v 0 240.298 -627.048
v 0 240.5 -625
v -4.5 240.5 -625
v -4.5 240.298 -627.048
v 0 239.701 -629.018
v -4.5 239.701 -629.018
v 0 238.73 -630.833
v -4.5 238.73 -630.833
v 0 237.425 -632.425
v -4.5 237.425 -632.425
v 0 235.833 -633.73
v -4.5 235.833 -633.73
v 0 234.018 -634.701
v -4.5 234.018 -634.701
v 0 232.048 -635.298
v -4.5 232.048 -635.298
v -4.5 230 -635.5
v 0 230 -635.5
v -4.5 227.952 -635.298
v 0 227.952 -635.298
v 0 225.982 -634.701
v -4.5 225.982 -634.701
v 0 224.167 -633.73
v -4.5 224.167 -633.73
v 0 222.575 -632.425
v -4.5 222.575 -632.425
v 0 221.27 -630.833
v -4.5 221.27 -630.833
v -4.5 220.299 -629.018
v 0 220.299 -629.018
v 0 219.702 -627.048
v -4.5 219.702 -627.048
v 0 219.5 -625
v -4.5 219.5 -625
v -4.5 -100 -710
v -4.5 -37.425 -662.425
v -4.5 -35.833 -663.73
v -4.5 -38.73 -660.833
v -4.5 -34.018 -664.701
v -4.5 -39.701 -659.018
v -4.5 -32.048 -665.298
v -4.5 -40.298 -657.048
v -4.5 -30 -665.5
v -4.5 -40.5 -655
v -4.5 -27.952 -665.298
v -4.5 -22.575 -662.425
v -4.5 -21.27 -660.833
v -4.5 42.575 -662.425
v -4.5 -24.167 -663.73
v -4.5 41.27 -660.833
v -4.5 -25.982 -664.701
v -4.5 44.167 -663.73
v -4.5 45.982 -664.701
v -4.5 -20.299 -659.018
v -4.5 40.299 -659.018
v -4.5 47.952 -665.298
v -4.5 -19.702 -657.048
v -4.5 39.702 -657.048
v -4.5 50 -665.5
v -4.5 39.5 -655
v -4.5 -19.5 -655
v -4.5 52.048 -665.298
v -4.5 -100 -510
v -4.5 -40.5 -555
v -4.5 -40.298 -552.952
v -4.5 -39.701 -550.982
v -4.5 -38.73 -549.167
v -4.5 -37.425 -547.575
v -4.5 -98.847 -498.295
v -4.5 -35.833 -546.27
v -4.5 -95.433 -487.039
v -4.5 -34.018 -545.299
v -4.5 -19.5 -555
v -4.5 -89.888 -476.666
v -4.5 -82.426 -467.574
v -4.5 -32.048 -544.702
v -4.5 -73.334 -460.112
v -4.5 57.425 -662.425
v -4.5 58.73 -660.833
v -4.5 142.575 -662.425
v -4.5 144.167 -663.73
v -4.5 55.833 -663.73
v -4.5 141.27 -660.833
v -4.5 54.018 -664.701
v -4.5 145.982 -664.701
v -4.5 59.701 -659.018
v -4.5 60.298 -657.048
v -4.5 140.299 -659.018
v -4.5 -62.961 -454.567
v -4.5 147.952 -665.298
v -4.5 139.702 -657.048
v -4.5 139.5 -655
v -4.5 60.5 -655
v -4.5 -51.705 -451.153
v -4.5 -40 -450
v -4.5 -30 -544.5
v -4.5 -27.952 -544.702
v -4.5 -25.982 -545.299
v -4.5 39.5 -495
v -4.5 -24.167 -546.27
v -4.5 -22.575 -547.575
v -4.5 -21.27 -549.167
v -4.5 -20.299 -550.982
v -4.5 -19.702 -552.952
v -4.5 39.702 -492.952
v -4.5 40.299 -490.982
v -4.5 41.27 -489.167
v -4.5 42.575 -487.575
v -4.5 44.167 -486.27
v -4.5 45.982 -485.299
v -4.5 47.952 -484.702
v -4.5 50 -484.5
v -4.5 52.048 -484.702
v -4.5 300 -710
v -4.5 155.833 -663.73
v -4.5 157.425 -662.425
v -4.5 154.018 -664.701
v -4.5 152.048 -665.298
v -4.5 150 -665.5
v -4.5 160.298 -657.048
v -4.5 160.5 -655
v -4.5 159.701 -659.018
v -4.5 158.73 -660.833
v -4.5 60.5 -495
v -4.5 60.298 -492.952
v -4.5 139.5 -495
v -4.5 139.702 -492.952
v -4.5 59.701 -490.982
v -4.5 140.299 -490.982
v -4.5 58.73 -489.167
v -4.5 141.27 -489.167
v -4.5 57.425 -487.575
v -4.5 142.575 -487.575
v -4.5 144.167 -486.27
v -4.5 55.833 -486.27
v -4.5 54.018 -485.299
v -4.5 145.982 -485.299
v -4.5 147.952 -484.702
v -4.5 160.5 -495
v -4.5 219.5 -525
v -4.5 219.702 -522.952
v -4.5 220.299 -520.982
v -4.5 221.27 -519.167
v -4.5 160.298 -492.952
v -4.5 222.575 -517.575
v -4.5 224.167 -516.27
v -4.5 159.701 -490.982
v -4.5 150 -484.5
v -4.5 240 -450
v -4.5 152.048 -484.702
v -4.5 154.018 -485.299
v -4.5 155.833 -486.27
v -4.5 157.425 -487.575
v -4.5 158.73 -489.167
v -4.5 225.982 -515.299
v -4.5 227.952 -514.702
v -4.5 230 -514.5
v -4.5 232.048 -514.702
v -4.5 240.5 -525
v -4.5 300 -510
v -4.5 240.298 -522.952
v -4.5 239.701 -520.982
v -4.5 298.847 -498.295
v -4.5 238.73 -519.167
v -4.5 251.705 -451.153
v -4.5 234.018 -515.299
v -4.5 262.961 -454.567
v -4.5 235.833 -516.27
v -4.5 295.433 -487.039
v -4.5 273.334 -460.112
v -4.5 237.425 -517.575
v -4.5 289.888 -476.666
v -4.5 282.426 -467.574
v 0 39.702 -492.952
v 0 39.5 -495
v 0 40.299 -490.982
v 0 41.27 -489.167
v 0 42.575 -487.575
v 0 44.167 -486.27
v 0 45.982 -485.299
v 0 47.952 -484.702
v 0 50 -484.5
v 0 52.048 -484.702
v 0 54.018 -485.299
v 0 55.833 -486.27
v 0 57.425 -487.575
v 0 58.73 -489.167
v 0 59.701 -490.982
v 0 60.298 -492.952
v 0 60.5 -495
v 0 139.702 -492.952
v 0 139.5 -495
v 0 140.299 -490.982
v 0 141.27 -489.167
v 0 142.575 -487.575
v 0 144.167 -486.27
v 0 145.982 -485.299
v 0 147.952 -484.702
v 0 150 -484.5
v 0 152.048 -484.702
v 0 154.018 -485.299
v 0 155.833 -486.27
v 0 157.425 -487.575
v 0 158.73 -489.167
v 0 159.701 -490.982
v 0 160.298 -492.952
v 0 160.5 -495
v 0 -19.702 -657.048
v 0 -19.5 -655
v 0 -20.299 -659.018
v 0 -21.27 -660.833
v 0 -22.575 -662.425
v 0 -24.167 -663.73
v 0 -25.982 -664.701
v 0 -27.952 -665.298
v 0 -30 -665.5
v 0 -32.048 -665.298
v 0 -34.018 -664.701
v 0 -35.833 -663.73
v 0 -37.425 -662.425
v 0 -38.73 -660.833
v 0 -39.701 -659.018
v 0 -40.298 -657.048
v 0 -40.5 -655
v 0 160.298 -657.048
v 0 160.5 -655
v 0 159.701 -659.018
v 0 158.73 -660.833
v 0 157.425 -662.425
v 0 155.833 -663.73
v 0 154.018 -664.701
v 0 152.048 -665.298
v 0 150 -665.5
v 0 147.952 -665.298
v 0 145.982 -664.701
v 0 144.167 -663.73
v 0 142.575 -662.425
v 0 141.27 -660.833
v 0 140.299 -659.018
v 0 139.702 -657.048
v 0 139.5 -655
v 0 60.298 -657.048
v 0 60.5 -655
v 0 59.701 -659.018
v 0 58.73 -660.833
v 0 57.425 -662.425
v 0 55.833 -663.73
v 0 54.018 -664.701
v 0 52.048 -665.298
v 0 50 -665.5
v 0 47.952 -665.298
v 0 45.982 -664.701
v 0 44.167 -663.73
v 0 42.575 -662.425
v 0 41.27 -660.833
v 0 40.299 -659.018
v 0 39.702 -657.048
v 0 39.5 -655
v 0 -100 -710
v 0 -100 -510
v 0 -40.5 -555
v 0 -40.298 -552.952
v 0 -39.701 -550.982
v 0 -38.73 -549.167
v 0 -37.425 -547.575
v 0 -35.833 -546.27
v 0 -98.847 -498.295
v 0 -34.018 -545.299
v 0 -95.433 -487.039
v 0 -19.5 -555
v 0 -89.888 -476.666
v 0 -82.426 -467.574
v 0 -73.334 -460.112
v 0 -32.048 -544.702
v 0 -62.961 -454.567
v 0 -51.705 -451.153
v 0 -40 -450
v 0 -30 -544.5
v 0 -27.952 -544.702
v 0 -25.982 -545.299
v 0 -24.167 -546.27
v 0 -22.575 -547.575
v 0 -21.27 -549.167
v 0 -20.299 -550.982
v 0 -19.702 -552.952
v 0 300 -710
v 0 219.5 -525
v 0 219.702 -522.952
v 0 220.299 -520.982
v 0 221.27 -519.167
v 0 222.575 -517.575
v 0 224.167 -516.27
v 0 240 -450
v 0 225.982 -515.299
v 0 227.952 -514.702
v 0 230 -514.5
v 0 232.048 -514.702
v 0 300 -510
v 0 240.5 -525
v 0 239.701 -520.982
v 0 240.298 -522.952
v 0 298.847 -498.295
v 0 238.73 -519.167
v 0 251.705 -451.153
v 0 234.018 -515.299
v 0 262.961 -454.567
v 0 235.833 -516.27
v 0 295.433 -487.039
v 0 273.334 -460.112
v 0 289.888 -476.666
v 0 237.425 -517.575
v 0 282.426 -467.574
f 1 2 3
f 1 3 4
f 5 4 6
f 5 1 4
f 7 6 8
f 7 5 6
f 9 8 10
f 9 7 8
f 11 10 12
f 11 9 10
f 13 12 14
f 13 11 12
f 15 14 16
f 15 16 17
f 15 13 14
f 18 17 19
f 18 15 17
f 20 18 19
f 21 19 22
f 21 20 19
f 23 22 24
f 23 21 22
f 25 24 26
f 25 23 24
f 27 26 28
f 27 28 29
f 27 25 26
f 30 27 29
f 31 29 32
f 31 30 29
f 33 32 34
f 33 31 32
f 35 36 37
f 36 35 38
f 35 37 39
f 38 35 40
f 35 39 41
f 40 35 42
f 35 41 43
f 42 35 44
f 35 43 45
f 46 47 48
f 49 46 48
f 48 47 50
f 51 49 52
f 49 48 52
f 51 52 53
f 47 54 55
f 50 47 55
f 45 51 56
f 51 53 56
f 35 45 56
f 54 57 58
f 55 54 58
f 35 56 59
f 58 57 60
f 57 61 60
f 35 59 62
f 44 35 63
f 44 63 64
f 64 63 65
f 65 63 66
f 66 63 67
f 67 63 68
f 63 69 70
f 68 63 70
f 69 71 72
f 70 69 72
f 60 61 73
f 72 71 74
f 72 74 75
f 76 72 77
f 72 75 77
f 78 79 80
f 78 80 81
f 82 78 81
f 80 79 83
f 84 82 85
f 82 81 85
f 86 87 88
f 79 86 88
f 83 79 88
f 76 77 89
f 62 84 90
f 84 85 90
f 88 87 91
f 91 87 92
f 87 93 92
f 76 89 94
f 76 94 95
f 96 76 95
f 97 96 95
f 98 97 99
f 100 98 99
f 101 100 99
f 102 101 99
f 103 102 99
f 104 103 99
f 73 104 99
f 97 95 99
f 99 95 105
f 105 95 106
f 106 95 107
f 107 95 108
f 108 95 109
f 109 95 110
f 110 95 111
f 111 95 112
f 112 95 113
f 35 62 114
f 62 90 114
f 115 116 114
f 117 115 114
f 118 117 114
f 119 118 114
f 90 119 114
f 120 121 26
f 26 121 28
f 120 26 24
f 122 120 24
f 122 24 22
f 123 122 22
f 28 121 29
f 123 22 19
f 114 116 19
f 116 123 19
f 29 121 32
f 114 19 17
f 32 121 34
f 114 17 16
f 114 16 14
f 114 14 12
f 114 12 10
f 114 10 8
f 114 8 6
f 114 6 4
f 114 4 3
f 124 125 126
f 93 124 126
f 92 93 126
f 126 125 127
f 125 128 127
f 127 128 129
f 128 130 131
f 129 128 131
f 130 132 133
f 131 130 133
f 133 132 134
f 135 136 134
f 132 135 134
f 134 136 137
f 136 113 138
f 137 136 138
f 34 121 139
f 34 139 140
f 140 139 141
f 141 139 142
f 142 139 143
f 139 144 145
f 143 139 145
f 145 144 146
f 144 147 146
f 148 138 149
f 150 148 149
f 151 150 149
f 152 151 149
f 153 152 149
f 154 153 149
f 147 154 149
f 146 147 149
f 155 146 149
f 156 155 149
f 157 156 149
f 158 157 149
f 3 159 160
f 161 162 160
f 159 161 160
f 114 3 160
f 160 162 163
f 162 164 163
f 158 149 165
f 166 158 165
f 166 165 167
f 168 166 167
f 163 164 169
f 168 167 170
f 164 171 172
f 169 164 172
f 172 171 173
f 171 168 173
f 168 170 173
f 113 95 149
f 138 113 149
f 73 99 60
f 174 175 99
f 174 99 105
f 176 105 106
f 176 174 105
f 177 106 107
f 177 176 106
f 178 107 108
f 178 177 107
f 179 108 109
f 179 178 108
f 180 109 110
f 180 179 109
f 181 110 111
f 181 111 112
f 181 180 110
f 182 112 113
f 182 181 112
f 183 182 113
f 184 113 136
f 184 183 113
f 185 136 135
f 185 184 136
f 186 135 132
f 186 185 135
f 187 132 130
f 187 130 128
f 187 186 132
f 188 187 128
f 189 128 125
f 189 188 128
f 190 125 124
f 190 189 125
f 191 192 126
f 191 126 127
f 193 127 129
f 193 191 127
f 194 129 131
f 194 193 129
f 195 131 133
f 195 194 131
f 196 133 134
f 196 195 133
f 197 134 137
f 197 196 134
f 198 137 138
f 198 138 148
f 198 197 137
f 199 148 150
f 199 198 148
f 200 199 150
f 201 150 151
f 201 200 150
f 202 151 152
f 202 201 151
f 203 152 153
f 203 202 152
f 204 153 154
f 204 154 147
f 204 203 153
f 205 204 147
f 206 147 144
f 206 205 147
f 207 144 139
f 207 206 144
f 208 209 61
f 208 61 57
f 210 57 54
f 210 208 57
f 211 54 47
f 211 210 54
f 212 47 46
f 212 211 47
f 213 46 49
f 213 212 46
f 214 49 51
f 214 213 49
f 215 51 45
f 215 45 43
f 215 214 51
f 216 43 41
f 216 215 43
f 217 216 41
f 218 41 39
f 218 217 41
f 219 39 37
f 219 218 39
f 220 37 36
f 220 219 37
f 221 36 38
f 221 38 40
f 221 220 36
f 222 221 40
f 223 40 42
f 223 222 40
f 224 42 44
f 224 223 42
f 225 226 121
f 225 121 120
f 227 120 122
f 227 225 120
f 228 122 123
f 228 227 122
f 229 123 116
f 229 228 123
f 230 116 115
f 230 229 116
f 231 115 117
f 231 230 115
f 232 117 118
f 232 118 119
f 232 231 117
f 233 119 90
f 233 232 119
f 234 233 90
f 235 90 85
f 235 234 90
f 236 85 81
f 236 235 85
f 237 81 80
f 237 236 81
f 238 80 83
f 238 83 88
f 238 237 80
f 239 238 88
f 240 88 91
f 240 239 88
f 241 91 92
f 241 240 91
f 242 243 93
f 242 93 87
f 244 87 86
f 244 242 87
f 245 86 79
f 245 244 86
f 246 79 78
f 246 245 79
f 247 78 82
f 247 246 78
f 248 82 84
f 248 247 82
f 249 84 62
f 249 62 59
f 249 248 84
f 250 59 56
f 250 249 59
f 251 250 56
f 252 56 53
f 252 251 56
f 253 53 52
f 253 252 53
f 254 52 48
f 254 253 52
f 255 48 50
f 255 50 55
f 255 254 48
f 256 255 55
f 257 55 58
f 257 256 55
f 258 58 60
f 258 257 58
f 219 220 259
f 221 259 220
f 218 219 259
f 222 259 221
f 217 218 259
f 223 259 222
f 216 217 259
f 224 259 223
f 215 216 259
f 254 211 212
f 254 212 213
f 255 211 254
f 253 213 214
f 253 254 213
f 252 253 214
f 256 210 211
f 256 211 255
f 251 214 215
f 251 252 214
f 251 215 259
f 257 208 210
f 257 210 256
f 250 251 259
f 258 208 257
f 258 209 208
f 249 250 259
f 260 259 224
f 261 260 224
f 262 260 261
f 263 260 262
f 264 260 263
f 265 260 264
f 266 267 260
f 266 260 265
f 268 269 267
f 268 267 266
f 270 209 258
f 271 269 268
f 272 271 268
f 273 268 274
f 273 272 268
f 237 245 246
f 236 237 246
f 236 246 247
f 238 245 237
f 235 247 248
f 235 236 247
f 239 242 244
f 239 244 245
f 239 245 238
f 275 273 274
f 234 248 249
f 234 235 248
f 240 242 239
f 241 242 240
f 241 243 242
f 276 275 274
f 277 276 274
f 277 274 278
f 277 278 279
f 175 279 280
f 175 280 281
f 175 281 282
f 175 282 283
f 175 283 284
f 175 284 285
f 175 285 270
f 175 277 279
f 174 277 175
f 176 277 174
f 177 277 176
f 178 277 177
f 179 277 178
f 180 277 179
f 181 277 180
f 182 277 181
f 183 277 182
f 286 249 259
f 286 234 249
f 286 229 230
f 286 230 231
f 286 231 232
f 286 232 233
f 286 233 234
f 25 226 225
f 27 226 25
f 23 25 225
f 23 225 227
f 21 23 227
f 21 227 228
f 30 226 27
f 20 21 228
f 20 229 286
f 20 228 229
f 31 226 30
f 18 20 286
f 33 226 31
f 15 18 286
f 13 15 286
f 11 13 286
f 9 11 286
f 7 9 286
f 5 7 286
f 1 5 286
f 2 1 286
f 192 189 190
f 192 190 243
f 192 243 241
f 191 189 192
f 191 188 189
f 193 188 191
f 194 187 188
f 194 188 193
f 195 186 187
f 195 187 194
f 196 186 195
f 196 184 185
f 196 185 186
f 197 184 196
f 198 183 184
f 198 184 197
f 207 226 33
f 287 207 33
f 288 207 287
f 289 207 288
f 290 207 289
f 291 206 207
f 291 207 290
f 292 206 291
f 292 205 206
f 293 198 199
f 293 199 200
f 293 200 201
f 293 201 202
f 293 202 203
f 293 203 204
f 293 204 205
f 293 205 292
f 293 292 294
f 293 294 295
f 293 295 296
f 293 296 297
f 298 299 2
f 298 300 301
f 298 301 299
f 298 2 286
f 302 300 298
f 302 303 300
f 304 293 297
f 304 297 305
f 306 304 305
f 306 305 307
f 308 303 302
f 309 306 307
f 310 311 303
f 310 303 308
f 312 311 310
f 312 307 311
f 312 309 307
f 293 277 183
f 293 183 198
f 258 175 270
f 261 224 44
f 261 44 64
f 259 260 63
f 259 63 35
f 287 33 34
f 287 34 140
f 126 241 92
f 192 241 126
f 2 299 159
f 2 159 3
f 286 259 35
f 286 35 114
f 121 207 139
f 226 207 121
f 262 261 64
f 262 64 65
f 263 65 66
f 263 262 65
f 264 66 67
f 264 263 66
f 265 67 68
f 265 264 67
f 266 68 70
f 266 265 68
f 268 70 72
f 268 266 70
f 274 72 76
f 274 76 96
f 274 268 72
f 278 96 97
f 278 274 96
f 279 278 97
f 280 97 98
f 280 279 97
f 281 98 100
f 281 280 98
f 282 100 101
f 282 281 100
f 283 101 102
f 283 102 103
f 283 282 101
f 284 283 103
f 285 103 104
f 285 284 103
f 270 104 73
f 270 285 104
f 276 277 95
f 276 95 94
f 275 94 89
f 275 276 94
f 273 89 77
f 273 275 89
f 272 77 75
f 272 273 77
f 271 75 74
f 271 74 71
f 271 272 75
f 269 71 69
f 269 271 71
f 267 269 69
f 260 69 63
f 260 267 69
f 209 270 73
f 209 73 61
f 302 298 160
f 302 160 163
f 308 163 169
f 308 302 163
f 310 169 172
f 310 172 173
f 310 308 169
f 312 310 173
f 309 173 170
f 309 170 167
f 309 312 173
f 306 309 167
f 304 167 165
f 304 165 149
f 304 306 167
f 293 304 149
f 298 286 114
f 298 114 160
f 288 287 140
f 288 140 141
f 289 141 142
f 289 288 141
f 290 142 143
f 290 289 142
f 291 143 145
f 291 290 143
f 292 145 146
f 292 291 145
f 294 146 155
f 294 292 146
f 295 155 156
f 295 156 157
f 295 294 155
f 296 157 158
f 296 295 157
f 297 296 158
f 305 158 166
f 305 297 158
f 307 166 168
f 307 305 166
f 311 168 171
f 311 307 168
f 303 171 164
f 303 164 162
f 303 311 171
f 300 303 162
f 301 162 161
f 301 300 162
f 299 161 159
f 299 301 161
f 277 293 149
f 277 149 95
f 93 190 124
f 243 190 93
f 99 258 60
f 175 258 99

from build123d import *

# Parameters (mm, degrees)
F1_DEPTH = 4.5


with BuildPart() as f1:
    # F0 (on Right) → F1 (new body)
    with BuildSketch(Plane.YZ):
        with BuildLine():
            Line((-100, -710), (300, -710))
            Line((300, -710), (300, -510))
            ThreePointArc((300, -510), (282.426407, -467.573593), (240, -450))
            Line((240, -450), (-40, -450))
            ThreePointArc((-40, -450), (-82.426407, -467.573593), (-100, -510))
            Line((-100, -510), (-100, -710))
        make_face()
        with BuildLine():
            ThreePointArc((-19.5, -655), (-30, -665.5), (-40.5, -655))
            Line((-40.5, -655), (-40.5, -555))
            ThreePointArc((-40.5, -555), (-30, -544.5), (-19.5, -555))
            Line((-19.5, -555), (-19.5, -655))
        make_face(mode=Mode.SUBTRACT)
        with BuildLine():
            Line((39.5, -655), (39.5, -495))
            ThreePointArc((39.5, -495), (50, -484.5), (60.5, -495))
            Line((60.5, -495), (60.5, -655))
            ThreePointArc((60.5, -655), (50, -665.5), (39.5, -655))
        make_face(mode=Mode.SUBTRACT)
        with BuildLine():
            Line((139.5, -655), (139.5, -495))
            ThreePointArc((139.5, -495), (150, -484.5), (160.5, -495))
            Line((160.5, -495), (160.5, -655))
            ThreePointArc((160.5, -655), (150, -665.5), (139.5, -655))
        make_face(mode=Mode.SUBTRACT)
        with BuildLine():
            ThreePointArc((240.5, -625), (230, -635.5), (219.5, -625))
            Line((219.5, -625), (219.5, -525))
            ThreePointArc((219.5, -525), (230, -514.5), (240.5, -525))
            Line((240.5, -525), (240.5, -625))
        make_face(mode=Mode.SUBTRACT)
    extrude(amount=-F1_DEPTH)


solid = f1.part
